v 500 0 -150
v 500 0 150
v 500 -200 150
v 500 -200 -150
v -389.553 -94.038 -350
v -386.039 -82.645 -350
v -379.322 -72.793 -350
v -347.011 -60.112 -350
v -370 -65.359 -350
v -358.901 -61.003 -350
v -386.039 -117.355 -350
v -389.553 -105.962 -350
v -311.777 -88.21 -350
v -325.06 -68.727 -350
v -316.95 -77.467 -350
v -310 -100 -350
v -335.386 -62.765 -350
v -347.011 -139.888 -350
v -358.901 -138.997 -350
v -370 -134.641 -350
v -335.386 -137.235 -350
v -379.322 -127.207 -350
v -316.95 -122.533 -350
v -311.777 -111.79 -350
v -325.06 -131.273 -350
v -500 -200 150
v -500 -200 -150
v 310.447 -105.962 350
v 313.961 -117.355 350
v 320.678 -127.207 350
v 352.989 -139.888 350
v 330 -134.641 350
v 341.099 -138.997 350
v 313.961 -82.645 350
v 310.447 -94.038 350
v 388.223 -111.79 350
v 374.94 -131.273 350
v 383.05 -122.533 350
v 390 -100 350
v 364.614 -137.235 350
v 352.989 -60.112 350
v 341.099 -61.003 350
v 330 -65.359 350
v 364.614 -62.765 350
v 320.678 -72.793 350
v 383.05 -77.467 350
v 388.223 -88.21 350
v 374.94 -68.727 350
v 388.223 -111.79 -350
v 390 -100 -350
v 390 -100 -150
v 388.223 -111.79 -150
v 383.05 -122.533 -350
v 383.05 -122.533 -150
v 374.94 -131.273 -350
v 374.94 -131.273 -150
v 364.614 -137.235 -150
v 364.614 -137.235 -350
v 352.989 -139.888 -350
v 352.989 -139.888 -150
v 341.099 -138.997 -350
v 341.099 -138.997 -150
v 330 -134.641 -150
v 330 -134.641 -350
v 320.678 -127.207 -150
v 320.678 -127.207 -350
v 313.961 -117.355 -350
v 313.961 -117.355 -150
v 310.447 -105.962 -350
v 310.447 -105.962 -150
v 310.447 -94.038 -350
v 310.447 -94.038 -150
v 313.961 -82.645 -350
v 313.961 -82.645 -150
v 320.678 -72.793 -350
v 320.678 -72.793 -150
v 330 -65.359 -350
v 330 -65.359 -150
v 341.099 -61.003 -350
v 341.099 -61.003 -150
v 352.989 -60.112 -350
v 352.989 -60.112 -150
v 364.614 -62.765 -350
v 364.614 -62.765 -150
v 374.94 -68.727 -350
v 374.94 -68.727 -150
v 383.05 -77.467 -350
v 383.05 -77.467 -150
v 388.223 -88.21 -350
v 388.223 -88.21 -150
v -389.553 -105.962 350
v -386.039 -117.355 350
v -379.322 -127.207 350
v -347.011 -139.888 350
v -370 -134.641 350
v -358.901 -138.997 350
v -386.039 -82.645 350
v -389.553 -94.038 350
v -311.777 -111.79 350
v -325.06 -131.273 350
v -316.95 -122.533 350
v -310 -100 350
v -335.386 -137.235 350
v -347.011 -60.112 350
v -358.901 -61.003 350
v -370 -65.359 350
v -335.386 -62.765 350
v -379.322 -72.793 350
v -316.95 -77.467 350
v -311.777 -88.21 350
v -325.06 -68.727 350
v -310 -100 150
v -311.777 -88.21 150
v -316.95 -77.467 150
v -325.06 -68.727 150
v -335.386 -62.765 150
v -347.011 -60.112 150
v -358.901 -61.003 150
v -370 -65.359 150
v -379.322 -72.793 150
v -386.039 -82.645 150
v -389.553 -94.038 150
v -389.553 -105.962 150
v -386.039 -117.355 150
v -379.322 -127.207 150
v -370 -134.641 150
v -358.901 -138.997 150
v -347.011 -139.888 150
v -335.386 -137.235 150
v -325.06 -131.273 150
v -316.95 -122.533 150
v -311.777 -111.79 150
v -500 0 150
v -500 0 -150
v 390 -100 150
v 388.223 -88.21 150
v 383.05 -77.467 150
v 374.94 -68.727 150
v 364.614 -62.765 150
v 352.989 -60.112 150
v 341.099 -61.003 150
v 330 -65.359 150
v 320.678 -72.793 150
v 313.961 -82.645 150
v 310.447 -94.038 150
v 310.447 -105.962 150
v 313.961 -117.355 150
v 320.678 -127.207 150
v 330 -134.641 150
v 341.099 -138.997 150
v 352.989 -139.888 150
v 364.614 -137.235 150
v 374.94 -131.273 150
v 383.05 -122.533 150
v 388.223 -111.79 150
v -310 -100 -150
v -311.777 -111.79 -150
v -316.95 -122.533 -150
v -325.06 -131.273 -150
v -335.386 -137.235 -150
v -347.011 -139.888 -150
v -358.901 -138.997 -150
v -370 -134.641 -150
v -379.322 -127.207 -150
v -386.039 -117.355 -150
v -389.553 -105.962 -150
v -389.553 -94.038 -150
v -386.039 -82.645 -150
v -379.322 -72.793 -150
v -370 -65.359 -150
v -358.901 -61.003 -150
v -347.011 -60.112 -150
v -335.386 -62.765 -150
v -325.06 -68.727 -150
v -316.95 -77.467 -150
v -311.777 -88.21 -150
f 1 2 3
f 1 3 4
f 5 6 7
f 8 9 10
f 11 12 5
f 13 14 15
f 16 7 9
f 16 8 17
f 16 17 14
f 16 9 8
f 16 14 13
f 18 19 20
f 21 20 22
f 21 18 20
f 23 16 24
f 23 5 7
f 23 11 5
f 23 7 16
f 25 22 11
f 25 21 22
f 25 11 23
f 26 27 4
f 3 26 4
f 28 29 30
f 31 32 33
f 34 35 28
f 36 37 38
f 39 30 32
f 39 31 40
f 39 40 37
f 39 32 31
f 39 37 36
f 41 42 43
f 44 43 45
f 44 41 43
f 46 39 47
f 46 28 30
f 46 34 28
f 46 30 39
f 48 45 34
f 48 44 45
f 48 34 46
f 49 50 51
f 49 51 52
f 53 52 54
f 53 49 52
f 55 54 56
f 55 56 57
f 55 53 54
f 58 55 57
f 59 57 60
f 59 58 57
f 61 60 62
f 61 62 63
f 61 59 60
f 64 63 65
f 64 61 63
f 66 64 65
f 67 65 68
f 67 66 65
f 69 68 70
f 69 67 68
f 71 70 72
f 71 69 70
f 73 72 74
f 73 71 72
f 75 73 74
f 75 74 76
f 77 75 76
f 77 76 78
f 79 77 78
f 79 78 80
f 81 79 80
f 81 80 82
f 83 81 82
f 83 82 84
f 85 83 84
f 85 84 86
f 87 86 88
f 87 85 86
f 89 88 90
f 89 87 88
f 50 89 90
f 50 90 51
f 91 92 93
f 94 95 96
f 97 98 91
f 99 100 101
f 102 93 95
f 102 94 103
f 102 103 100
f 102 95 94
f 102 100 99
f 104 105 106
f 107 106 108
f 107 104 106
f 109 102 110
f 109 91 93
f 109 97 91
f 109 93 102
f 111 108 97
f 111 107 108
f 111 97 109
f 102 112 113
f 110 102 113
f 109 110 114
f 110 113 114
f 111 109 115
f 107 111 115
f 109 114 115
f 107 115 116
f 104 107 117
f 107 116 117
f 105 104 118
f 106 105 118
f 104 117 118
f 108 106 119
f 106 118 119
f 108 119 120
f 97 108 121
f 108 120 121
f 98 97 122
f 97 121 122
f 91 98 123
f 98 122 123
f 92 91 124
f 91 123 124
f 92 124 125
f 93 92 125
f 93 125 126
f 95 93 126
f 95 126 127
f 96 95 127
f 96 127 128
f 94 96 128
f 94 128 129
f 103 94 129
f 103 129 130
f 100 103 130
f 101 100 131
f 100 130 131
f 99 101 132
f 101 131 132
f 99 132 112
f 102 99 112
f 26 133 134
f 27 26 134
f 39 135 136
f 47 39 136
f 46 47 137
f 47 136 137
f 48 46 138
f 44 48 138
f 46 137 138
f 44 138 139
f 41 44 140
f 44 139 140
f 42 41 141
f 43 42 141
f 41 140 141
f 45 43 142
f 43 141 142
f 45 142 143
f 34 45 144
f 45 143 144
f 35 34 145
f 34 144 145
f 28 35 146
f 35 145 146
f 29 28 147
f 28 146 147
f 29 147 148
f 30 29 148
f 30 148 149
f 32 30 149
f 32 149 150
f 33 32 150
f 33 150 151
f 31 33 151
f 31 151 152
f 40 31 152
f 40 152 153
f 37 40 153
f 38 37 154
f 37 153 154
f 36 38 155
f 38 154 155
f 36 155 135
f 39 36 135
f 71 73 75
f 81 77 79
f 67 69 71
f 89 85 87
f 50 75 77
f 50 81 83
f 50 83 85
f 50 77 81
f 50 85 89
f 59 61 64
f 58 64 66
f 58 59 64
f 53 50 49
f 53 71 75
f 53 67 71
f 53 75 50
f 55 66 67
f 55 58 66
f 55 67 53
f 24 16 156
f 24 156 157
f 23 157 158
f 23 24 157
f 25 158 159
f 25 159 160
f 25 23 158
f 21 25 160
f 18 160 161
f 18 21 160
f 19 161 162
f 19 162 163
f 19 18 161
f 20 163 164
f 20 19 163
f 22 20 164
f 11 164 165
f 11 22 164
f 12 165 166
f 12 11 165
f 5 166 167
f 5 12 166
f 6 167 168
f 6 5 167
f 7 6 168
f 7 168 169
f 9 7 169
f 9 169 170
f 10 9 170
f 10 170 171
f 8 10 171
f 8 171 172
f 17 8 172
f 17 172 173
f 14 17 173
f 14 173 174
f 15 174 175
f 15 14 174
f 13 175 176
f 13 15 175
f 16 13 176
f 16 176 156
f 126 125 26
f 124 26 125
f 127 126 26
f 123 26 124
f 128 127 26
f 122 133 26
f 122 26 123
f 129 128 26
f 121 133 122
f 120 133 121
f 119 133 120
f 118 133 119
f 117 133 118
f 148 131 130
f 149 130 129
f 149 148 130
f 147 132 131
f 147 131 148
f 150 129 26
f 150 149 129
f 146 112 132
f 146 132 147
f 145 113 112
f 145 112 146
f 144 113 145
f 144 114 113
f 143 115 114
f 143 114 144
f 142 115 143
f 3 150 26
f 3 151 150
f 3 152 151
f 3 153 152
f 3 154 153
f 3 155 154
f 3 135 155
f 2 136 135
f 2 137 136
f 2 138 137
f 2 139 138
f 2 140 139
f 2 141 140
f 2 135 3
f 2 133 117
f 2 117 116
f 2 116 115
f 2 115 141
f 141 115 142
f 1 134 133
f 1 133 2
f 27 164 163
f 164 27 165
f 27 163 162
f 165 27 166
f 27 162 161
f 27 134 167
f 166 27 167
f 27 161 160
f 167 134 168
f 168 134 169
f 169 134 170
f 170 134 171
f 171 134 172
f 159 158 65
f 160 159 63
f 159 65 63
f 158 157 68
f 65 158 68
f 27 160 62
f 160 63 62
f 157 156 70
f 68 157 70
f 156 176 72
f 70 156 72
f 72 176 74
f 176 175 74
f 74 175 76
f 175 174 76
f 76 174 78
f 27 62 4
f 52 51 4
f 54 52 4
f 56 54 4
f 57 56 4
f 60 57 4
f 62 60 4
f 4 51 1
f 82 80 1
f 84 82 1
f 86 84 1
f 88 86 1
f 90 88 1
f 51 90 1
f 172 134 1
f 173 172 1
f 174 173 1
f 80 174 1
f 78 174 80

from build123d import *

# Parameters (mm, degrees)
SKETCH2_W           = 1000
SKETCH2_H           = 300
BOSS_EXTRUDE1_DEPTH = 200
SKETCH3_R           = 40
BOSS_EXTRUDE2_DEPTH = 200
BOSS_EXTRUDE3_START = 200
SKETCH5_R           = 40
BOSS_EXTRUDE3_DEPTH = 200


with BuildPart() as part:
    # Sketch2 → Boss-Extrude1 (new body)
    with BuildSketch(Plane(origin=(0, 0, 0), x_dir=(1, 0, 0), z_dir=(0, 1, 0))):
        Rectangle(SKETCH2_W, SKETCH2_H)
    extrude(amount=-BOSS_EXTRUDE1_DEPTH)

    # Sketch3 → Boss-Extrude2 (add)
    with BuildSketch(Plane.XY.offset(150)):
        with Locations((-350, -100)):
            Circle(SKETCH3_R)
        with Locations((350, -100)):
            Circle(SKETCH3_R)
    extrude(amount=BOSS_EXTRUDE2_DEPTH)

    # Sketch5 → Boss-Extrude3 (add)
    with BuildSketch(Plane(origin=(0, 0, -150), x_dir=(-1, 0, 0), z_dir=(0, 0, -1)).offset(BOSS_EXTRUDE3_START)):
        with Locations(Location((-350, -100, 0), (0, 0, 180))):
            Circle(SKETCH5_R)
        with Locations(Location((350, -100, 0), (0, 0, 180))):
            Circle(SKETCH5_R)
    extrude(amount=-BOSS_EXTRUDE3_DEPTH)


solid = part.part
